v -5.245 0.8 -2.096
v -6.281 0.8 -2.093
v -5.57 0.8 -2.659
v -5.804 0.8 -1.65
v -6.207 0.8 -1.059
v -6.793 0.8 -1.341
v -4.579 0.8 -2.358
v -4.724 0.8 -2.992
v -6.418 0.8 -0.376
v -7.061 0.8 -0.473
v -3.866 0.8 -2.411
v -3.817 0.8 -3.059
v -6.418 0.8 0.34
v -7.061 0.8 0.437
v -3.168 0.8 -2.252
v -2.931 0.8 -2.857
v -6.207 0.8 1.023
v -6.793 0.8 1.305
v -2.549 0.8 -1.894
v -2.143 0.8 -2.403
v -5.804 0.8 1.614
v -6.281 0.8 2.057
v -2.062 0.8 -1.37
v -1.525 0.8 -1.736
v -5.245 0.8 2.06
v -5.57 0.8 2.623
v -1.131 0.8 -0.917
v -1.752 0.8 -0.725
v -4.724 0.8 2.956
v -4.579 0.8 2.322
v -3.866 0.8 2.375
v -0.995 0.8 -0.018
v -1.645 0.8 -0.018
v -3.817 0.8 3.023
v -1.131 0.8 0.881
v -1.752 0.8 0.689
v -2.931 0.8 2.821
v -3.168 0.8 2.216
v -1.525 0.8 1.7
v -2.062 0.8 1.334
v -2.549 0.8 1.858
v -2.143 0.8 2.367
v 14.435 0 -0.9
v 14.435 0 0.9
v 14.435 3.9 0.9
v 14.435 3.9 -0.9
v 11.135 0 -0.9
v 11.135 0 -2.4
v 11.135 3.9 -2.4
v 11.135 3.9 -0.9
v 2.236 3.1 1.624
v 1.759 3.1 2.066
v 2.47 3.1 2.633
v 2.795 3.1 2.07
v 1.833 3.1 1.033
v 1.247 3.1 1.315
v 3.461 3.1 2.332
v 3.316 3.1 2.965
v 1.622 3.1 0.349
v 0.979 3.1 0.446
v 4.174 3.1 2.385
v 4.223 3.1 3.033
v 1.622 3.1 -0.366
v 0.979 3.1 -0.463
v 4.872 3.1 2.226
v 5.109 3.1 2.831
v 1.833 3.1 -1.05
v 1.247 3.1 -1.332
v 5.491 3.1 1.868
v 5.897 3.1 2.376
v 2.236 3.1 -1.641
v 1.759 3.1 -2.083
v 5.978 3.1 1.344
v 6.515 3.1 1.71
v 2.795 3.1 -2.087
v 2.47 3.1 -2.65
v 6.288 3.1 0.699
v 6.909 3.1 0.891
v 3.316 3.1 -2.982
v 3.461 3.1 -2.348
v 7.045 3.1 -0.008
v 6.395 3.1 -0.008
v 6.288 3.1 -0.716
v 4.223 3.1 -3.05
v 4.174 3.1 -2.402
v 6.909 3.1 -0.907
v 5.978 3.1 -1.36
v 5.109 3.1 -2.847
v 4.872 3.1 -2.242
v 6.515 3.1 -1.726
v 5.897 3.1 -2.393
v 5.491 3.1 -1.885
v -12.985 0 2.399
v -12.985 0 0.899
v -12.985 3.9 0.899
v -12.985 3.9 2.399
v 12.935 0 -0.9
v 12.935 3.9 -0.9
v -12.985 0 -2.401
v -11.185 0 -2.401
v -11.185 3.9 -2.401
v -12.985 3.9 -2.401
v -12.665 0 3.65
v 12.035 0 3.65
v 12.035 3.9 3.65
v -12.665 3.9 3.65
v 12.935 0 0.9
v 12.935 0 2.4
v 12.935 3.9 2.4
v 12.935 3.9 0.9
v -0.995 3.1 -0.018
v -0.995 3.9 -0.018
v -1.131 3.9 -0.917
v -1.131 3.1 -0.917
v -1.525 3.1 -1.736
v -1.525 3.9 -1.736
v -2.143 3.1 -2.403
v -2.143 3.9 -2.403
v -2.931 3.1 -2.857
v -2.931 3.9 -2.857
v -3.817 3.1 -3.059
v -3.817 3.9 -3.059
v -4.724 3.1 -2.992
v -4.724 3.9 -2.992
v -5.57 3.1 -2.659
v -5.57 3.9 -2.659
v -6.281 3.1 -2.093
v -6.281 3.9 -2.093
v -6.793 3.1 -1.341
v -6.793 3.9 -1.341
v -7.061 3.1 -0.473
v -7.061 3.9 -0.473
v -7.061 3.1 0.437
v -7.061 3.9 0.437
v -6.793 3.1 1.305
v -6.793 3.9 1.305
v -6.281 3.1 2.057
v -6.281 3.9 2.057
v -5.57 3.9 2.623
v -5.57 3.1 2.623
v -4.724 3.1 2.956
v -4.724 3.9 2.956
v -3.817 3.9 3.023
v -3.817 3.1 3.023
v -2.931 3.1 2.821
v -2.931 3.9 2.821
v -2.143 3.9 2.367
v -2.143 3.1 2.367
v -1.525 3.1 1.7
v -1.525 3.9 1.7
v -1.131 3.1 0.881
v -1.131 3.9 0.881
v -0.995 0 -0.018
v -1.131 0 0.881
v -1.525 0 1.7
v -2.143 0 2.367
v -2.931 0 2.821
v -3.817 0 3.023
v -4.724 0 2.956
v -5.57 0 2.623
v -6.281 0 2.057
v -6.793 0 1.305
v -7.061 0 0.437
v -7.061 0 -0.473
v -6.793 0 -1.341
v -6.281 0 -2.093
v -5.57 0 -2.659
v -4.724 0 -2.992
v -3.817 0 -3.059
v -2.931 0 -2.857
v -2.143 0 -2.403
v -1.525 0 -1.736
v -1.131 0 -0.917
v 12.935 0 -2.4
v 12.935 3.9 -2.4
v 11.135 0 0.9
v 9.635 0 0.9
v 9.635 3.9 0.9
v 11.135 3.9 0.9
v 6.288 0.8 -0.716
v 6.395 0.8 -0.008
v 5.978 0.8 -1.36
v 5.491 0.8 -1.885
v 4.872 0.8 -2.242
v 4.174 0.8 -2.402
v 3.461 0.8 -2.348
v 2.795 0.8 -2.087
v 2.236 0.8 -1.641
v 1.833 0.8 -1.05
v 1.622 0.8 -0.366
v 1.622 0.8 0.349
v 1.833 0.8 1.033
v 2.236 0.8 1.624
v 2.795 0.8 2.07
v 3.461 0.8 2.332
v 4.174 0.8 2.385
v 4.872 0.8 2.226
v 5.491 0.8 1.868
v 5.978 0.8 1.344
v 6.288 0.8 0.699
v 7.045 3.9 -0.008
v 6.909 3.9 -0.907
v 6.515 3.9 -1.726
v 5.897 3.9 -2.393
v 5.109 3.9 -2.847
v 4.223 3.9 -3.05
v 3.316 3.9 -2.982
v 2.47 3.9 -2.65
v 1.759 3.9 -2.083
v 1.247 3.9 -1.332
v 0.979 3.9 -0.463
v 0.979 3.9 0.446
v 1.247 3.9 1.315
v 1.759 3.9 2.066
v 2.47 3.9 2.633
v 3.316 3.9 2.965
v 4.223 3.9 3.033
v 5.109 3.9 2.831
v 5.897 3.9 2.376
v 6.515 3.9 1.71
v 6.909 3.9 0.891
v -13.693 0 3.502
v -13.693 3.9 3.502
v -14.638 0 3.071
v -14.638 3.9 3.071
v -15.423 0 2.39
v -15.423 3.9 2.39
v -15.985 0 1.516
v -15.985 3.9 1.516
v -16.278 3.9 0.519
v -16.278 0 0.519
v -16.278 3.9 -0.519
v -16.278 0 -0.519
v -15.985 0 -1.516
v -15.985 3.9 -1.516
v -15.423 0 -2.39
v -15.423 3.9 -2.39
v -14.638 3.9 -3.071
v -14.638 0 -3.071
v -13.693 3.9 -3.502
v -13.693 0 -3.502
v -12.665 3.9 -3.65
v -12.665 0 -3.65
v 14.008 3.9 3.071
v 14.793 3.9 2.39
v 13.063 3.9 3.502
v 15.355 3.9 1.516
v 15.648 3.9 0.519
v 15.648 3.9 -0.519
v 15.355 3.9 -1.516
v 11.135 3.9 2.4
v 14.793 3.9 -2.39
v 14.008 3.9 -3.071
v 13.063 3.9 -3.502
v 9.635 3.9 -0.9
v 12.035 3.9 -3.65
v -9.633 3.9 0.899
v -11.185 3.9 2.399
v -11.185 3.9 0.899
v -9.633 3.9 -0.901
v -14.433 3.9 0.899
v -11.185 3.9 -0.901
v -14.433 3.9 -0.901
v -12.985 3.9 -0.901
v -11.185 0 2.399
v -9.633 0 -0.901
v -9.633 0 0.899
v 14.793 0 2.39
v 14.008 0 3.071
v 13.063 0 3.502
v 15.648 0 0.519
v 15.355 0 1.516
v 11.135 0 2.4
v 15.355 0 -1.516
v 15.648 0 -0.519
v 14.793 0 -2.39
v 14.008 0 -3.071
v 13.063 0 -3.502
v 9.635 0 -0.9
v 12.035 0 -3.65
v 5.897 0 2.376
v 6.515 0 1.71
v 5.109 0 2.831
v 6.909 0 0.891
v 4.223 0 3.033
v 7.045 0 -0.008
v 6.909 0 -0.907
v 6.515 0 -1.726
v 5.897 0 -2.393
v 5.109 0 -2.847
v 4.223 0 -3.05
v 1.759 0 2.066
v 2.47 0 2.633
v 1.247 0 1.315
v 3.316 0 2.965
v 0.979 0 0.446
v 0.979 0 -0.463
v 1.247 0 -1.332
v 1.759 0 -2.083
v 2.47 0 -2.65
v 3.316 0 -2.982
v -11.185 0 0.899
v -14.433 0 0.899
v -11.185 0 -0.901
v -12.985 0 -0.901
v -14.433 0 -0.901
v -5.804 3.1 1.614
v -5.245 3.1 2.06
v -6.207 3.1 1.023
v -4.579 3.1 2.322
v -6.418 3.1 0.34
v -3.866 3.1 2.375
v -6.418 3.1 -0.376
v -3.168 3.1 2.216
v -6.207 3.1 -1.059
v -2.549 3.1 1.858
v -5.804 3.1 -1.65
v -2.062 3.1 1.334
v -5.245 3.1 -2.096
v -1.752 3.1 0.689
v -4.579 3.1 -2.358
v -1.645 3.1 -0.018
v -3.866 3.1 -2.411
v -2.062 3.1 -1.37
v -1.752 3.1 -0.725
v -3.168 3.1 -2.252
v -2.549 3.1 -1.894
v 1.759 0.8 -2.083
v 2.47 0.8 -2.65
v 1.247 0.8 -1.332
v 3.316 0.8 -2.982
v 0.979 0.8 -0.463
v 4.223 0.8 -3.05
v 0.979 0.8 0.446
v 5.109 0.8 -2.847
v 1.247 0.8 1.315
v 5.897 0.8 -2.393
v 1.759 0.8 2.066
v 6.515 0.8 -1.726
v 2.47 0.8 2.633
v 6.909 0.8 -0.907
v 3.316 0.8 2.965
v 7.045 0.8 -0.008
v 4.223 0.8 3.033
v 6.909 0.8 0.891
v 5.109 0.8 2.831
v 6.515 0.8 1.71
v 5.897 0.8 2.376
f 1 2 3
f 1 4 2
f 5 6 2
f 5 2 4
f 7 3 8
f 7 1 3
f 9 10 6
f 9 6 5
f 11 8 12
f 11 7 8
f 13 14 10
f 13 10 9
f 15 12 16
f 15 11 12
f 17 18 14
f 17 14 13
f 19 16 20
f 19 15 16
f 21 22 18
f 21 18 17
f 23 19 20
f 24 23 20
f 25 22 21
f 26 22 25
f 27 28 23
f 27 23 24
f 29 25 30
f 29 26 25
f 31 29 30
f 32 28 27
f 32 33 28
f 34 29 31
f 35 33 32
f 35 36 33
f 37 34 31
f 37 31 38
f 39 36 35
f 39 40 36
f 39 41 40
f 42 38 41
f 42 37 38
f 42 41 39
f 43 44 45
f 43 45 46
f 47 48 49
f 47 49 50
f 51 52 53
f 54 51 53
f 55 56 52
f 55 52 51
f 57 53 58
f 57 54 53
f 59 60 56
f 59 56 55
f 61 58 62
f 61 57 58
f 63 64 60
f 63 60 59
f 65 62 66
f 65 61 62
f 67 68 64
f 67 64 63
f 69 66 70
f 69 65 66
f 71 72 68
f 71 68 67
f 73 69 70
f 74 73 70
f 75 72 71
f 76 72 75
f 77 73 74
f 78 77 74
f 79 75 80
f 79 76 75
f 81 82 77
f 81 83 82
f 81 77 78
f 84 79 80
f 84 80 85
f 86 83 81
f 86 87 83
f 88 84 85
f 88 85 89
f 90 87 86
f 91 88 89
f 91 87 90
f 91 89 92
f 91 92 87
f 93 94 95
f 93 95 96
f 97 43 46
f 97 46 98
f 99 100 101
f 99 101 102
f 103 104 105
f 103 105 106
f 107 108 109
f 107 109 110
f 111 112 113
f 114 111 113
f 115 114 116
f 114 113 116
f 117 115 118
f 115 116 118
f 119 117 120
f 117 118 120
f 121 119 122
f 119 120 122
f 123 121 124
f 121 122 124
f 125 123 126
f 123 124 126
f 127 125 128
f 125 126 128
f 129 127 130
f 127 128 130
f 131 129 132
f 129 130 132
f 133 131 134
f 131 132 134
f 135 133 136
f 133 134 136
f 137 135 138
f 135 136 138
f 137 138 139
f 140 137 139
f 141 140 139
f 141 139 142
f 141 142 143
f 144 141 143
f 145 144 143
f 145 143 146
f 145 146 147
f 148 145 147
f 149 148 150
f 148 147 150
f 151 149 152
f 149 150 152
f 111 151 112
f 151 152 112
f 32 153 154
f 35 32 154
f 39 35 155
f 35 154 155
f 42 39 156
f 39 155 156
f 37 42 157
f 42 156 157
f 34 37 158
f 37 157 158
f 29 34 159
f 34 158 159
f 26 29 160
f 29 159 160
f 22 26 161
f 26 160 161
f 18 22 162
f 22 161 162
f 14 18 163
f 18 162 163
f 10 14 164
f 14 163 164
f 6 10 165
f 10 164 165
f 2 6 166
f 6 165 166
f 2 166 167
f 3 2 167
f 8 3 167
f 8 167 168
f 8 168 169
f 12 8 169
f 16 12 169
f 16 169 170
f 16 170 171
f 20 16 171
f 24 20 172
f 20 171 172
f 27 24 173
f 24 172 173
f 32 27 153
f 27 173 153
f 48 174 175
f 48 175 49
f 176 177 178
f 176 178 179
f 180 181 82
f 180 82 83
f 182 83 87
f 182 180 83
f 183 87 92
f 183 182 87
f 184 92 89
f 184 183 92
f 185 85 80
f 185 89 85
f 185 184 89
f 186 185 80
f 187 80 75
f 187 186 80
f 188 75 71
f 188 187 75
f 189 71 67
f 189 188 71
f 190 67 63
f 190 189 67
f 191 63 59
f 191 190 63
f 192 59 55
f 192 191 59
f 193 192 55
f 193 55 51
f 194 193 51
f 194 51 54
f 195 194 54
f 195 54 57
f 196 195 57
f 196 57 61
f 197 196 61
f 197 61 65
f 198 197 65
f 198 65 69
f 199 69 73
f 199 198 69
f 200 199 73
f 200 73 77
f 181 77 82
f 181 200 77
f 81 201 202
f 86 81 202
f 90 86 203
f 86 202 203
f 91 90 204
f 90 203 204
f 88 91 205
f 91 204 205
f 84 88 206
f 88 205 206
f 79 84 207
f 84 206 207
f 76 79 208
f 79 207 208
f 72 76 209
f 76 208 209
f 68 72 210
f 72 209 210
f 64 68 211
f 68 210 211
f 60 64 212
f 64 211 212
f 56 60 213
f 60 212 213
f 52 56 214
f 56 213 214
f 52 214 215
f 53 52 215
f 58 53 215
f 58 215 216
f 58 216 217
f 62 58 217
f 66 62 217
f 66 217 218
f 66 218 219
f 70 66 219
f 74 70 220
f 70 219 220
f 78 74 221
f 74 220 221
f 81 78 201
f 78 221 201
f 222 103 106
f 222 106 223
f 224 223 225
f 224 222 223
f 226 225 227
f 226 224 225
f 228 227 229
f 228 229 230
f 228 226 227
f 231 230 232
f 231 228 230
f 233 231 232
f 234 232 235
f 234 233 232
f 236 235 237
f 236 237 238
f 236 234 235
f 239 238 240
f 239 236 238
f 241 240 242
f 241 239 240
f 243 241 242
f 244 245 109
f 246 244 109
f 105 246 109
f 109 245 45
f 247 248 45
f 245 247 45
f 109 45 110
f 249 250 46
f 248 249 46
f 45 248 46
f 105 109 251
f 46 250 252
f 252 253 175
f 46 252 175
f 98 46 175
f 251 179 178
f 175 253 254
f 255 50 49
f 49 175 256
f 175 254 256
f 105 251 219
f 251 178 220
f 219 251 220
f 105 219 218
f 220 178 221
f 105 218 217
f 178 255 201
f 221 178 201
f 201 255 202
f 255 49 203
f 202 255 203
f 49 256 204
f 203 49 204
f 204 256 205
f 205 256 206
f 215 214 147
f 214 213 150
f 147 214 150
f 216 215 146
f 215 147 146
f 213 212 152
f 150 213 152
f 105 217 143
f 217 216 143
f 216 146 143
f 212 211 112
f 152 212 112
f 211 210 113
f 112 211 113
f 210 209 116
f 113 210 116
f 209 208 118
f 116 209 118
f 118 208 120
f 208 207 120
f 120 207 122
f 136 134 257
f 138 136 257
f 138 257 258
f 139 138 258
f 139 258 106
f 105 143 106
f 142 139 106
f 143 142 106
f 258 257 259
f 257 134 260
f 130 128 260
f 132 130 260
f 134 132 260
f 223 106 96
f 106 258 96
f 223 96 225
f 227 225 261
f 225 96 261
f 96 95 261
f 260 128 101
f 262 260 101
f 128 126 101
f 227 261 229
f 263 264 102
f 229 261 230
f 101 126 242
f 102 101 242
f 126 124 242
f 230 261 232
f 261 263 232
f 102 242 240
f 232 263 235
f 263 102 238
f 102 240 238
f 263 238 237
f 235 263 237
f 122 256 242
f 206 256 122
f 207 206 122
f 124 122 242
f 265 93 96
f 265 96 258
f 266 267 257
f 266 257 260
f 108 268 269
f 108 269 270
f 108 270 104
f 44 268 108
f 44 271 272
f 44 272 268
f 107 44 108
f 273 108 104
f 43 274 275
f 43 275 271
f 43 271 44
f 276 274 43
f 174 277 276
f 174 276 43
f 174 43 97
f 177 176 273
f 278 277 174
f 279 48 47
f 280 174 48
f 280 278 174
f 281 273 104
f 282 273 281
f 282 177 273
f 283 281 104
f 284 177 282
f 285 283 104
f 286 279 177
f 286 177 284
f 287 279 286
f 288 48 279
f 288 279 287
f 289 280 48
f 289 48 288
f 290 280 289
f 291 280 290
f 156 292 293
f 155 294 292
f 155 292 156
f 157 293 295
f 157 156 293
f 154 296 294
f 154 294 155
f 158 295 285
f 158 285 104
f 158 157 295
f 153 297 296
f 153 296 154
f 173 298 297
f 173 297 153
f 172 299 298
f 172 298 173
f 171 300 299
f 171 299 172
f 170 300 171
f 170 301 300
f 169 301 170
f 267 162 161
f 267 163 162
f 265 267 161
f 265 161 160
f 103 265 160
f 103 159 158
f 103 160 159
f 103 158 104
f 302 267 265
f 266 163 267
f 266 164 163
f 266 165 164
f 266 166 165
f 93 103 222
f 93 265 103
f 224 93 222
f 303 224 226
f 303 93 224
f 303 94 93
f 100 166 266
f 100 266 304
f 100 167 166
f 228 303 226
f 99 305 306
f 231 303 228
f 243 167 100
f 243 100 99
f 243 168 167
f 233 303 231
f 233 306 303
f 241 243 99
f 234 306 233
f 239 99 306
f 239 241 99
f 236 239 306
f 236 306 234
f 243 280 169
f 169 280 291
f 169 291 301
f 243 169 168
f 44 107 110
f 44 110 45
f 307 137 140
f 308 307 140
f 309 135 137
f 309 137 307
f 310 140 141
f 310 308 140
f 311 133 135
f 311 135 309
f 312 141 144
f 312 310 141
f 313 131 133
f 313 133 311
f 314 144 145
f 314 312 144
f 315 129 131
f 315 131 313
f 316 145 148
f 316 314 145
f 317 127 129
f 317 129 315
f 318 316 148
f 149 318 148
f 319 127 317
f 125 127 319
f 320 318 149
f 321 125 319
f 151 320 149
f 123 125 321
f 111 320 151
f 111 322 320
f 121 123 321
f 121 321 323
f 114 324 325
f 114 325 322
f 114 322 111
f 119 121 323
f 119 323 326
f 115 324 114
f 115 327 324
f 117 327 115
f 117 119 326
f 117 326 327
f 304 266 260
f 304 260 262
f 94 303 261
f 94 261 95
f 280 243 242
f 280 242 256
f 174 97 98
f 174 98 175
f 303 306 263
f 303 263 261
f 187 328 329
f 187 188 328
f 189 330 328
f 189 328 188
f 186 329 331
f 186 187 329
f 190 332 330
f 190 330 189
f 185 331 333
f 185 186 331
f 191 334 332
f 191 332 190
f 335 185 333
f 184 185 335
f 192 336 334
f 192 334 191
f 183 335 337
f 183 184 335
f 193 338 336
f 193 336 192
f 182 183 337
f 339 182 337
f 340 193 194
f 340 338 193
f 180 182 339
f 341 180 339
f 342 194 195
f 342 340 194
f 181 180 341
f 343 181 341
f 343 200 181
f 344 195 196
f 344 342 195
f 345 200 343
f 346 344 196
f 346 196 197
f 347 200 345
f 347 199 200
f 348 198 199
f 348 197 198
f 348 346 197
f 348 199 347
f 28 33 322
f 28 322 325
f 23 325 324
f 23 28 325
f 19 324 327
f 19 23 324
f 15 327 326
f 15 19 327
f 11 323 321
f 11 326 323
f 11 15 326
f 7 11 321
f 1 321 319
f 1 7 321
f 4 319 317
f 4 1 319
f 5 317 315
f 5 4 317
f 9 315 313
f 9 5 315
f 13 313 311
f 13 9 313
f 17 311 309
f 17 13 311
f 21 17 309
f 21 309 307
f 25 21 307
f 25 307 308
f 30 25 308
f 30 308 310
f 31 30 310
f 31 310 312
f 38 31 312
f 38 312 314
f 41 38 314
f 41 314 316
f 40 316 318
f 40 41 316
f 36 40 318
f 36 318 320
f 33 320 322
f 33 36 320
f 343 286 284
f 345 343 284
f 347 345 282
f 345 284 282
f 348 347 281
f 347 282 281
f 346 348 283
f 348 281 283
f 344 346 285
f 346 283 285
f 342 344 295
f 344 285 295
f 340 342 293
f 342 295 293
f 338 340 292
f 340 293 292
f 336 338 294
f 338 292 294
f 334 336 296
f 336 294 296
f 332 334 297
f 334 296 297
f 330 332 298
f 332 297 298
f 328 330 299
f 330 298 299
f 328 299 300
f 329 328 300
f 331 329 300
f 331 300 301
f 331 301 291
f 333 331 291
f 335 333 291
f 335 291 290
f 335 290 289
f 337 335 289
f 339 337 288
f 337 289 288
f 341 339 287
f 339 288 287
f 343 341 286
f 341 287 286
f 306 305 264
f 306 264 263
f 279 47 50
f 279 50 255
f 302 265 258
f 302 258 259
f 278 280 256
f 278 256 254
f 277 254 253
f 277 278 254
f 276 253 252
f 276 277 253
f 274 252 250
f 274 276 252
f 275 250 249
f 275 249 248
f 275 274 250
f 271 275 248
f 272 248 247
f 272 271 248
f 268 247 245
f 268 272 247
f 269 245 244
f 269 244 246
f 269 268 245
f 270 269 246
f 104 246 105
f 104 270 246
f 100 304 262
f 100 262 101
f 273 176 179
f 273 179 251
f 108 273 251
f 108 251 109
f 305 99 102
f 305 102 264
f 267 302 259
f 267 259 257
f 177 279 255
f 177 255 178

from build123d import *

# Parameters (mm, degrees)
SKETCH1_R           = 2.4
BOSS_EXTRUDE1_DEPTH = 3.9
SKETCH2_R           = 3.05
CUT_EXTRUDE1_DEPTH  = 0.8
SKETCH3_R           = 3.05
CUT_EXTRUDE2_DEPTH  = 0.8


with BuildPart() as part:
    # Sketch1 → Boss-Extrude1 (new body)
    with BuildSketch(Plane(origin=(0, 0, 0), x_dir=(1, 0, 0), z_dir=(0, 1, 0))):
        with BuildLine():
            Line((-12.665, 3.65), (12.035, 3.65))
            ThreePointArc((12.035, 3.65), (15.685, 0), (12.035, -3.65))
            Line((12.035, -3.65), (-12.665, -3.65))
            ThreePointArc((-12.665, -3.65), (-16.315, 0), (-12.665, 3.65))
        make_face()
        with Locations((-4.045, 0.018008222)):
            Circle(SKETCH1_R, mode=Mode.SUBTRACT)
        with Locations((3.995, 0.008270612)):
            Circle(SKETCH1_R, mode=Mode.SUBTRACT)
        Polygon((11.135, 2.4), (11.135, 0.9), (9.635, 0.9), (9.635, -0.9), (11.135, -0.9), (11.135, -2.4), (12.935, -2.4), (12.935, -0.9), (14.435, -0.9), (14.435, 0.9), (12.935, 0.9), (12.935, 2.4), align=None, mode=Mode.SUBTRACT)
        Polygon((-12.985, 2.401087844), (-12.985, 0.901087844), (-14.433060202, 0.901087844), (-14.433060202, -0.898912156), (-12.985, -0.898912156), (-12.985, -2.398912156), (-11.185, -2.398912156), (-11.185, -0.898912156), (-9.633060202, -0.898912156), (-9.633060202, 0.901087844), (-11.185, 0.901087844), (-11.185, 2.401087844), align=None, mode=Mode.SUBTRACT)
    extrude(amount=BOSS_EXTRUDE1_DEPTH)

    # Sketch2 → Cut-Extrude1 (cut)
    with BuildSketch(Plane(origin=(0, 3.9, 0), x_dir=(1, 0, 0), z_dir=(0, 1, 0))):
        with Locations((-4.045, 0.018008222)):
            Circle(SKETCH2_R)
        with Locations((3.995, 0.008270612)):
            Circle(SKETCH2_R)
    extrude(amount=-CUT_EXTRUDE1_DEPTH, mode=Mode.SUBTRACT)

    # Sketch3 → Cut-Extrude2 (cut)
    with BuildSketch(Plane.XZ):
        with Locations((3.995, -0.008270612)):
            Circle(SKETCH3_R)
        with Locations((-4.045, -0.018008222)):
            Circle(SKETCH3_R)
    extrude(amount=-CUT_EXTRUDE2_DEPTH, mode=Mode.SUBTRACT)


solid = part.part
